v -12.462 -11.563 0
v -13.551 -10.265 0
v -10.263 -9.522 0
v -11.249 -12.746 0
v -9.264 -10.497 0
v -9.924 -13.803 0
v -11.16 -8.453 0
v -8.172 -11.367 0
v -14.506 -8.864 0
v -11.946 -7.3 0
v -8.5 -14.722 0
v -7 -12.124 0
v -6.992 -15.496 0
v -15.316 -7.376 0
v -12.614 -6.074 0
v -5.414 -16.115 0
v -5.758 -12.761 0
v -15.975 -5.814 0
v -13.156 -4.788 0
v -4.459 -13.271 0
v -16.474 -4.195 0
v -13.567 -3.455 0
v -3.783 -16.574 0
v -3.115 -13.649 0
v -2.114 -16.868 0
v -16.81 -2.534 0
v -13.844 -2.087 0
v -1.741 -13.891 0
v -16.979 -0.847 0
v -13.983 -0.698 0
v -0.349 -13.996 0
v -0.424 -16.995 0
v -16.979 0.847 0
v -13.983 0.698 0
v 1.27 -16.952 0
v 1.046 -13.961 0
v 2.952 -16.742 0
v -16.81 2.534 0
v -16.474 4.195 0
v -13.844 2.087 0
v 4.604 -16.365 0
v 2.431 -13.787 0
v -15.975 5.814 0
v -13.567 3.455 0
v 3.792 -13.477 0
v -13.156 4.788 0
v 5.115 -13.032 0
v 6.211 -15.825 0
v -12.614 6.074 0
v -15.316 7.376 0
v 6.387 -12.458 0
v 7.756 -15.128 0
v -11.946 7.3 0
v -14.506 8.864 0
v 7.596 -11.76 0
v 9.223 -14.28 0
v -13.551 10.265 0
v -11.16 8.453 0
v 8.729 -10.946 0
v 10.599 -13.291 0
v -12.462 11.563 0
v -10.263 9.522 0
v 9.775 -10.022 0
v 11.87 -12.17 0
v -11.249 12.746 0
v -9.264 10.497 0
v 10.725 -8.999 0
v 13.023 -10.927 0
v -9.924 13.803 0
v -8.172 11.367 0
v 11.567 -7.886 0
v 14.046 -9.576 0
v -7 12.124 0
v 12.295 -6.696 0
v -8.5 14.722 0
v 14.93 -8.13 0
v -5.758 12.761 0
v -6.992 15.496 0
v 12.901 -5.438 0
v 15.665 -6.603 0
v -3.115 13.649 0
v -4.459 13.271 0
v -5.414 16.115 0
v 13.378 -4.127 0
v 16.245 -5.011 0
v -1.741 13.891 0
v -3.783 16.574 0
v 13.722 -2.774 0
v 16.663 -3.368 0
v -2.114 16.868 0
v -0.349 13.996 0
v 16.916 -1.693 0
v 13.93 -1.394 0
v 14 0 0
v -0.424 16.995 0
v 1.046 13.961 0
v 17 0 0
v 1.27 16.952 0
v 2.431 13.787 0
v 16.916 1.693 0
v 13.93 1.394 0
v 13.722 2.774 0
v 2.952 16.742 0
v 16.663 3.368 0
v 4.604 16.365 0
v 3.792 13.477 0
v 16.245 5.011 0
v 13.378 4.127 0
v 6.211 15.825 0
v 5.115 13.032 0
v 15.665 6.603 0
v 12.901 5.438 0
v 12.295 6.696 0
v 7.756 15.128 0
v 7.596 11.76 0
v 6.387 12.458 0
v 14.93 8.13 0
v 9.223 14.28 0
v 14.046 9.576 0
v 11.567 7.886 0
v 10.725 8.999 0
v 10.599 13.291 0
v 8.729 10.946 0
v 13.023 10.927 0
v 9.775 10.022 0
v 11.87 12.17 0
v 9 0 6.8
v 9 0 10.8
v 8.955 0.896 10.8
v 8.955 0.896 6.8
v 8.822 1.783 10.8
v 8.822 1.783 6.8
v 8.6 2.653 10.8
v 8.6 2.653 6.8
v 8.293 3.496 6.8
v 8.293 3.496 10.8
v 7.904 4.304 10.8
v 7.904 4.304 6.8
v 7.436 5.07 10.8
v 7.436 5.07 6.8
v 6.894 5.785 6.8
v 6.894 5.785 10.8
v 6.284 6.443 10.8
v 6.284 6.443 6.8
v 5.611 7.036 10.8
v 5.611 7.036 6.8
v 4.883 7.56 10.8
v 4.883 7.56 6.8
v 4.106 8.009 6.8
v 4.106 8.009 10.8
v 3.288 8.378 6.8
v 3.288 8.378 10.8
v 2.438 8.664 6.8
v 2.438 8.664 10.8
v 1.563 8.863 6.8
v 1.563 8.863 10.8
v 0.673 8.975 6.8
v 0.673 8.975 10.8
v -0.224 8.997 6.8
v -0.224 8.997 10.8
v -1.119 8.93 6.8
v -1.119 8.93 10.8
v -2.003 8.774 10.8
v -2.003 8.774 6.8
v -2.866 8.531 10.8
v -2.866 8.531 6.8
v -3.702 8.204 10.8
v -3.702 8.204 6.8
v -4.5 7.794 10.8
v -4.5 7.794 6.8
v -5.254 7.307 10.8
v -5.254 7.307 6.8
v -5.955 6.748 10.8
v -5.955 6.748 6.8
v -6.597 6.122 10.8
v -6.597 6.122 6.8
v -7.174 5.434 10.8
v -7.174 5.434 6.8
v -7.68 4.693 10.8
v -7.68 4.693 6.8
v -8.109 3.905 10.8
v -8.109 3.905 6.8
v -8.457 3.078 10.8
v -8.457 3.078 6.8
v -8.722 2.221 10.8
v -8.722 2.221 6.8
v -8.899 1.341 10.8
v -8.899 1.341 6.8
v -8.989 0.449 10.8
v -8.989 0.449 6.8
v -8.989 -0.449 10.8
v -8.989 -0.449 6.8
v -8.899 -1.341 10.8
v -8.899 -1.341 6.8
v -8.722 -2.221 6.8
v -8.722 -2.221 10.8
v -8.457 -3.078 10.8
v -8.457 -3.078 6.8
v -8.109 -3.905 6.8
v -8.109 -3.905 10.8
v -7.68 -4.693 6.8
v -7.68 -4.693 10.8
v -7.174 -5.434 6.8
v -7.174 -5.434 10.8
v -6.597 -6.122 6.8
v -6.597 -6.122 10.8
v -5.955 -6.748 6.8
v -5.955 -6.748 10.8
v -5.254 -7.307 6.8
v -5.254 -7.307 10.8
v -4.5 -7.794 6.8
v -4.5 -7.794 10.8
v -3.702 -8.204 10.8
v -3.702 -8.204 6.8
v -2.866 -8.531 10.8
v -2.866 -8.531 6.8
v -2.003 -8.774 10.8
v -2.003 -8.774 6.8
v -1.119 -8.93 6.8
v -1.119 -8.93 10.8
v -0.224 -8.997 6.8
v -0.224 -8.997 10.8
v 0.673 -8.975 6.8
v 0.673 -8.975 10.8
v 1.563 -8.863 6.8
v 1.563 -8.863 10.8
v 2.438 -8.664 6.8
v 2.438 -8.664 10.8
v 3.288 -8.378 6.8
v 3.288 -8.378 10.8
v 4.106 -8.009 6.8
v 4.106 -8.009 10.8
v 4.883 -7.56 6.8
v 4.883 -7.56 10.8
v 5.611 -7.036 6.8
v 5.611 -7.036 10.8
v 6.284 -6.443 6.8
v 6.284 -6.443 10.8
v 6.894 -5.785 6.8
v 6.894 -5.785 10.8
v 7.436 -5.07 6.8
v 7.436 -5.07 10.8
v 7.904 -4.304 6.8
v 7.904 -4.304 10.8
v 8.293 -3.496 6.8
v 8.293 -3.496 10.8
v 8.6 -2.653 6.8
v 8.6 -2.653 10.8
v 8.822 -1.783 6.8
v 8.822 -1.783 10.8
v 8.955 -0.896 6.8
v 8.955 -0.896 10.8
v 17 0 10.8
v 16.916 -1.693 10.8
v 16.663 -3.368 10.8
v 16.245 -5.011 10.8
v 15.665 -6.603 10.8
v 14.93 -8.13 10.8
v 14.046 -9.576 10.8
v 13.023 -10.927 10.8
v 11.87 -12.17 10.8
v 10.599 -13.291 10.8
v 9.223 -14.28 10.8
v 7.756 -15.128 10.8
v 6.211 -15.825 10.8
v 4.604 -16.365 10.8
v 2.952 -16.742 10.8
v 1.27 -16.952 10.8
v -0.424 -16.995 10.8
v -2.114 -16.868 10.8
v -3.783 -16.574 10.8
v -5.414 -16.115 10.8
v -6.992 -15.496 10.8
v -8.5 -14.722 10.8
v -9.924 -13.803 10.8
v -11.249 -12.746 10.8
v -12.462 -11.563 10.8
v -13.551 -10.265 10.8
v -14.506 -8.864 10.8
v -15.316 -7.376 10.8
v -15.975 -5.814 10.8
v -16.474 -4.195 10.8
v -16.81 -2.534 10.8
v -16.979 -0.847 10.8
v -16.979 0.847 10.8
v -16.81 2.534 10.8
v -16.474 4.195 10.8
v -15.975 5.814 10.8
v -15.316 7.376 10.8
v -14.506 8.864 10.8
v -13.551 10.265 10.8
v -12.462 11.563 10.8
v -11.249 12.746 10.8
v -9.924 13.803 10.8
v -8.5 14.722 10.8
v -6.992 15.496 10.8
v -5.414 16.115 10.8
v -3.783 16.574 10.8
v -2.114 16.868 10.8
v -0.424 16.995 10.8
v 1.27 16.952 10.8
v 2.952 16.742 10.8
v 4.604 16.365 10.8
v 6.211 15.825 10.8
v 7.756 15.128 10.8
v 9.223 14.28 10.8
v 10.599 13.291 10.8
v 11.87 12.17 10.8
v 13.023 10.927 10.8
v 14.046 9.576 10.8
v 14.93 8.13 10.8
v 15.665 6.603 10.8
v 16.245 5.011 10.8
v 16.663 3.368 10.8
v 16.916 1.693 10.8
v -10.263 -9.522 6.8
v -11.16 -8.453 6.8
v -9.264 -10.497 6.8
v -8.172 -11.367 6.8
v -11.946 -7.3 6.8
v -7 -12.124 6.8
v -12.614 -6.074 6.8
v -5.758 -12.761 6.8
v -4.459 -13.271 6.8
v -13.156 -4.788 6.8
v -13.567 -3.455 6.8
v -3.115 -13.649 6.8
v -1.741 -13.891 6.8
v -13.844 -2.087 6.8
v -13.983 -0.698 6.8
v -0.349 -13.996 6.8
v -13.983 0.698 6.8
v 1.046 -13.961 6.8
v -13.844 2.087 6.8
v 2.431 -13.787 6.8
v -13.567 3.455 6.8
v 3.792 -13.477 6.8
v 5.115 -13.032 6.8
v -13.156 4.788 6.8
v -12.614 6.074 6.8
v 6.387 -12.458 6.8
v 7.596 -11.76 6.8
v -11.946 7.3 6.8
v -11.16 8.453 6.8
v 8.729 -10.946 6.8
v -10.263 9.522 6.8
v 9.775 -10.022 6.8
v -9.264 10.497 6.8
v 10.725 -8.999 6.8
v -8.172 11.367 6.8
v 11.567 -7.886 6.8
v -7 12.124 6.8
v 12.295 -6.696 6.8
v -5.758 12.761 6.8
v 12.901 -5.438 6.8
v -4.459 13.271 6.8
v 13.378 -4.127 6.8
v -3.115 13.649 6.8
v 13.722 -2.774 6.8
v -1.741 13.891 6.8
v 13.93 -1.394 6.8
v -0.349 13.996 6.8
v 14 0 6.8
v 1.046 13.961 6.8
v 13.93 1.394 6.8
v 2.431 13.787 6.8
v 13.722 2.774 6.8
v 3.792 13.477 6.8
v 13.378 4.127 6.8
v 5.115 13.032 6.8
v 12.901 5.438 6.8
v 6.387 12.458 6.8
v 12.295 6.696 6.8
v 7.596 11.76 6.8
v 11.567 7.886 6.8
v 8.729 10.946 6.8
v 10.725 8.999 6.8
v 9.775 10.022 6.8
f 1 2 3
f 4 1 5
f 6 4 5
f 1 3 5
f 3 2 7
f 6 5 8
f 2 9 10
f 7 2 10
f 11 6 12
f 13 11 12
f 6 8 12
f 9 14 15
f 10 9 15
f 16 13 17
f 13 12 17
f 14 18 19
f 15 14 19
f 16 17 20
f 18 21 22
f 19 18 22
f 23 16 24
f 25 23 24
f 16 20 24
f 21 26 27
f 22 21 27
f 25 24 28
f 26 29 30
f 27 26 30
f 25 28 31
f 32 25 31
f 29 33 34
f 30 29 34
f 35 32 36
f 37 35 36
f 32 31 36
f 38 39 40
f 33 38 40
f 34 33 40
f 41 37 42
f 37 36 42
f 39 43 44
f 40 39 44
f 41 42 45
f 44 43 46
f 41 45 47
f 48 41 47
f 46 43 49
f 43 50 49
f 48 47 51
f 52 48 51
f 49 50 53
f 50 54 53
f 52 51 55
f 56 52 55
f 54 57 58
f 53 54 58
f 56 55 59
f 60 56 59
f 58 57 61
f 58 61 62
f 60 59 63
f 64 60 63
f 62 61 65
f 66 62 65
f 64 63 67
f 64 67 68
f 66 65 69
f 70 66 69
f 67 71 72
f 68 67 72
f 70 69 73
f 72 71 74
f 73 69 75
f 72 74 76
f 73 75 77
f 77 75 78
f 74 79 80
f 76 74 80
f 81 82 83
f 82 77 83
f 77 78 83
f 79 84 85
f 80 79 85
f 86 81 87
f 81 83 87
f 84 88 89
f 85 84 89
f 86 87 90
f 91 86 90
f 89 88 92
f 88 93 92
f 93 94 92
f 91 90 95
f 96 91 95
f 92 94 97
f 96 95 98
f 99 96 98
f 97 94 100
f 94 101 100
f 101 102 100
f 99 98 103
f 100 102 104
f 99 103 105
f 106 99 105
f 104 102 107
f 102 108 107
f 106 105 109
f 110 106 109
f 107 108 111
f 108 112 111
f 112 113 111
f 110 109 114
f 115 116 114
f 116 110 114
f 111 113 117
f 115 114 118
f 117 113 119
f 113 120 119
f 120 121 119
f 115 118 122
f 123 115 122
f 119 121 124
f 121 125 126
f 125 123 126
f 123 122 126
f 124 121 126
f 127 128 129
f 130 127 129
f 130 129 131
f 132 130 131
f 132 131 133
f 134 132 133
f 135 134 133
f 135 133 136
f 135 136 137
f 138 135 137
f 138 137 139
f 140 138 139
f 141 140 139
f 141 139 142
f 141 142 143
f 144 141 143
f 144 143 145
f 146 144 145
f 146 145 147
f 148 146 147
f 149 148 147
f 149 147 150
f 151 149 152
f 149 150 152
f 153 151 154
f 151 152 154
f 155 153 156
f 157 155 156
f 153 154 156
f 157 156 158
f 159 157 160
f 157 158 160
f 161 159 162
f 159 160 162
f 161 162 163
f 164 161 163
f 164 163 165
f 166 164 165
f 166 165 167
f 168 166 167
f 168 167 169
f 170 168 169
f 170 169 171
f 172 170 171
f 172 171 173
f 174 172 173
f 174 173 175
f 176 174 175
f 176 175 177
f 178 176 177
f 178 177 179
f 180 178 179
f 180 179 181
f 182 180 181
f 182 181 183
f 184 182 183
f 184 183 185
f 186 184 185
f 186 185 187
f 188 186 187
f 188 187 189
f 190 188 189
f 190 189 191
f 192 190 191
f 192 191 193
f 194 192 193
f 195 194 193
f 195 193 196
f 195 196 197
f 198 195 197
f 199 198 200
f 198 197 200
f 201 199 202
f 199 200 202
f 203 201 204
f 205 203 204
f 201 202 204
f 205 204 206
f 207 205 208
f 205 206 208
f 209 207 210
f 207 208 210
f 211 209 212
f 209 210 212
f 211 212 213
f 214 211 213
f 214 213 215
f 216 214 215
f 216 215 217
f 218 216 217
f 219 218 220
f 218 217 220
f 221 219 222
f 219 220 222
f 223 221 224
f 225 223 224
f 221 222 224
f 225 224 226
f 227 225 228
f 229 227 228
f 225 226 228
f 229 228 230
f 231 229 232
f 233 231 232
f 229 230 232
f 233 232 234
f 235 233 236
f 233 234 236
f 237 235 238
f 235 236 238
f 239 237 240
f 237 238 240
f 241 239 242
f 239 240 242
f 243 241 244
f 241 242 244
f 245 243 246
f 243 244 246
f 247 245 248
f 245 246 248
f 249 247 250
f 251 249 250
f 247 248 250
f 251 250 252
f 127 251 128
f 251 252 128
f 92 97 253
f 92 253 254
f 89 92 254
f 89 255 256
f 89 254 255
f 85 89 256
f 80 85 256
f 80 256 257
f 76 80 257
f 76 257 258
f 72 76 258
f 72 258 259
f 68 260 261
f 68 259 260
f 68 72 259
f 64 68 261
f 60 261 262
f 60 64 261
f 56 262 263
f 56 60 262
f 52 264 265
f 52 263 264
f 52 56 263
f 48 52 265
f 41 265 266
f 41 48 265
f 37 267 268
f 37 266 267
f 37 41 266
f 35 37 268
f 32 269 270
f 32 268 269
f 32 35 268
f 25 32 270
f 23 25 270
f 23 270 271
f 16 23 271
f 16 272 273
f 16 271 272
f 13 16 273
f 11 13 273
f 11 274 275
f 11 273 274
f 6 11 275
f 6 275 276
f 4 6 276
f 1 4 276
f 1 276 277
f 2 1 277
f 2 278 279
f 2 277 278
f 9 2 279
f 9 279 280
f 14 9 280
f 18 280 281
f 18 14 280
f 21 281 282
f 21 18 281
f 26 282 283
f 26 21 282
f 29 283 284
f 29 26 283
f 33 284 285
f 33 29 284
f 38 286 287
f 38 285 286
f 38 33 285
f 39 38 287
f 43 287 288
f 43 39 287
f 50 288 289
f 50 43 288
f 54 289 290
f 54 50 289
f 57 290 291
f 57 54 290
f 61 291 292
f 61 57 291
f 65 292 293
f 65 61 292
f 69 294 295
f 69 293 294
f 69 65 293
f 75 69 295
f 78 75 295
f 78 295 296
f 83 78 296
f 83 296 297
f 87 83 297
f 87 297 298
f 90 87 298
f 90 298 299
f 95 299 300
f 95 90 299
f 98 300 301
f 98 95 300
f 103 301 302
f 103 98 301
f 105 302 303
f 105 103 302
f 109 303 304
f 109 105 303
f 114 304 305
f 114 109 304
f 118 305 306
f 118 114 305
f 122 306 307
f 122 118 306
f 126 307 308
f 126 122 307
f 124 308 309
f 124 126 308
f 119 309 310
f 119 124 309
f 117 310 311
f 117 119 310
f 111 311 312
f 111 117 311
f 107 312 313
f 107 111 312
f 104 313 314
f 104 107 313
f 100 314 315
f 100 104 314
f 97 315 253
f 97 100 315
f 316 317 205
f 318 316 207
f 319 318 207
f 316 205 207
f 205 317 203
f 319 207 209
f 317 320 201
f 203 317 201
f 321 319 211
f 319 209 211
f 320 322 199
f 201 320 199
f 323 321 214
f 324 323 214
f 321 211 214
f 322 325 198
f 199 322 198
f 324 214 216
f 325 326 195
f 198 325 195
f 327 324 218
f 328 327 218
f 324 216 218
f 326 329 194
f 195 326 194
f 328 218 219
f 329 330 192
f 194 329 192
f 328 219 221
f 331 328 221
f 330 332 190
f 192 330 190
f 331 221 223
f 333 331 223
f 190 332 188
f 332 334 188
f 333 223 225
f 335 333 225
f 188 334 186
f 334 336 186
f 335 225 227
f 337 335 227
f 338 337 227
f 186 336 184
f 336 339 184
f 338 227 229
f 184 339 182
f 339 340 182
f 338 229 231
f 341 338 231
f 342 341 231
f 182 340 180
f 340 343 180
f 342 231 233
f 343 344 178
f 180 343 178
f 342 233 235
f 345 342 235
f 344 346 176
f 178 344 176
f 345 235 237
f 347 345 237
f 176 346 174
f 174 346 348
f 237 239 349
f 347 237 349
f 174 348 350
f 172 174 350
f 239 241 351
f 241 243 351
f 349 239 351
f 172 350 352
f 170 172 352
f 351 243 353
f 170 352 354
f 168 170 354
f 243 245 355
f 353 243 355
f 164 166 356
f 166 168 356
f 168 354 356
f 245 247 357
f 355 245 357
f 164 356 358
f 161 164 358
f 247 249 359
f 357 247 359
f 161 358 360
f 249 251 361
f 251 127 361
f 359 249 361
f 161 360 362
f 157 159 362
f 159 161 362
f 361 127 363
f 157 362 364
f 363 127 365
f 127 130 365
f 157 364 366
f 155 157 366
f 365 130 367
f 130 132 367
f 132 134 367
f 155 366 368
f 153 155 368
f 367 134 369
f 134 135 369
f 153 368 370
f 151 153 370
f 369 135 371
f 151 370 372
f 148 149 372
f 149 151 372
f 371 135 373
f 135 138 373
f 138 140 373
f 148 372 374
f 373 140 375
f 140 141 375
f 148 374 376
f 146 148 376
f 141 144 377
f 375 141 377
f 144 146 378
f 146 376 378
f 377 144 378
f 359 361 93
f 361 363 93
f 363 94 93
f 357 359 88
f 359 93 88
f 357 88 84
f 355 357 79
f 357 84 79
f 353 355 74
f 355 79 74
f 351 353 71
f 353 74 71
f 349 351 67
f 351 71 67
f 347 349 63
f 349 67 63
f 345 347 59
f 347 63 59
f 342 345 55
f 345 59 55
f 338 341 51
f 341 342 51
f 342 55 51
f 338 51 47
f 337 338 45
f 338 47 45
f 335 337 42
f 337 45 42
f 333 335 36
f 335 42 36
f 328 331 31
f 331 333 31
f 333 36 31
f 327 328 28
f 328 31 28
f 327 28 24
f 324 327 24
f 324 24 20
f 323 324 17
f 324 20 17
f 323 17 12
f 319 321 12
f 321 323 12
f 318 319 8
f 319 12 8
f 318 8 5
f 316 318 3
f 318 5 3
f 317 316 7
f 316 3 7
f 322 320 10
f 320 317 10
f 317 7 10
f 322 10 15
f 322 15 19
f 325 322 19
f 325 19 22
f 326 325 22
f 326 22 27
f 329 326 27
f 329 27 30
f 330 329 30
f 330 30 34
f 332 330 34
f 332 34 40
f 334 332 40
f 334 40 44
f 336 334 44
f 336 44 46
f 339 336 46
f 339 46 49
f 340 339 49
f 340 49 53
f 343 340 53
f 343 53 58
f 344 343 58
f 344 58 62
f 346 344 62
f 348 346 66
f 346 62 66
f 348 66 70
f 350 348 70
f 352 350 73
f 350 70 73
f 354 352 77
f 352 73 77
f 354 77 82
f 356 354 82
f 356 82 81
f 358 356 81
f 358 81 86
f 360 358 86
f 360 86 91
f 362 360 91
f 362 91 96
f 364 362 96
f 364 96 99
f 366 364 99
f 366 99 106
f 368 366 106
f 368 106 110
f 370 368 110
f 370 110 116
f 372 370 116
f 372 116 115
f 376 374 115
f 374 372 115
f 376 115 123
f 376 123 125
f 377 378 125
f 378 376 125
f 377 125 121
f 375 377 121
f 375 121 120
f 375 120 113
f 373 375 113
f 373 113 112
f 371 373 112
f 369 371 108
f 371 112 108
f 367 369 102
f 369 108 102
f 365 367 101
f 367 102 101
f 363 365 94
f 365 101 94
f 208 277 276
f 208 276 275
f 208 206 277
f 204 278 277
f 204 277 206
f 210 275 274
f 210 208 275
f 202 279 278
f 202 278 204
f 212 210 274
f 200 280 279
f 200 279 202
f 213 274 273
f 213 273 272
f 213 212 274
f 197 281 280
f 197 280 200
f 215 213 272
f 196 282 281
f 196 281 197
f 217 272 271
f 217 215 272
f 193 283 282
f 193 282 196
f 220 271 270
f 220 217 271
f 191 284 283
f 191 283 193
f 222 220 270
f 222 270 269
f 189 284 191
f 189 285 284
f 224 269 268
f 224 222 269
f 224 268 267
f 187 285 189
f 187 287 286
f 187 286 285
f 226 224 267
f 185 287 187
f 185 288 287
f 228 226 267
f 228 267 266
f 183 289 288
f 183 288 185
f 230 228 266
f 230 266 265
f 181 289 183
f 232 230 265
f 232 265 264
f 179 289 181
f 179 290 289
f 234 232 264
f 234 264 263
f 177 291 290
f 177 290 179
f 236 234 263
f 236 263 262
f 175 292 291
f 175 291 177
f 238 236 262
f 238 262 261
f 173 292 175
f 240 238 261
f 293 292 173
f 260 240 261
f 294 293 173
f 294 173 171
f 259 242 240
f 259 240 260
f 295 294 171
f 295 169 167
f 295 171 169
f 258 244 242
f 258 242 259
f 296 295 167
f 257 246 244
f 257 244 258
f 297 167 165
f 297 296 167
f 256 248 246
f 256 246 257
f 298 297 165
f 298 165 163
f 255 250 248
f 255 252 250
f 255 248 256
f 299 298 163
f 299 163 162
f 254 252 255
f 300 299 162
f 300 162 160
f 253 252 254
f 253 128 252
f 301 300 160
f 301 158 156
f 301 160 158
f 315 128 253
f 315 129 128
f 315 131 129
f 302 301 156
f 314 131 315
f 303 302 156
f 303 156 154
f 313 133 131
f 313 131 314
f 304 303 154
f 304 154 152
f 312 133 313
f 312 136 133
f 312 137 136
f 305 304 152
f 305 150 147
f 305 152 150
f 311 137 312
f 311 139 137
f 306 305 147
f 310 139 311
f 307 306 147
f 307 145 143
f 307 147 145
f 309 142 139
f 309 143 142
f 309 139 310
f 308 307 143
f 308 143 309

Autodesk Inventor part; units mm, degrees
ref_plane "YZ Plane" through (0, 0, 0) normal (1, 0, 0) x (0, 1, 0)
ref_plane "XZ Plane" through (0, 0, 0) normal (0, 1, 0) x (-1, 0, 0)
ref_plane "XY Plane" through (0, 0, 0) normal (0, 0, 1) x (1, 0, 0)
sketch "Sketch1" plane through (0, 0, 0) normal (0, 0, 1) x (1, 0, 0)
  circle A0 centre (0, 0) radius 14
  circle A1 centre (0, 0) radius 17
  dimension "d0" = 28
  dimension "d2" = 34
extrude "Extrusion1" add sketch "Sketch1" along normal blind 6.8
sketch "Sketch2" plane through (0, 0, 6.8) normal (0, 0, 1) x (1, 0, 0)
  circle A0 centre (0, 0) radius 17 projected
extrude "Extrusion2" add sketch "Sketch2" along normal blind 4
sketch "Sketch3" plane through (0, 0, 10.8) normal (0, 0, 1) x (1, 0, 0)
  circle A0 centre (0, 0) radius 17 projected
  circle A1 centre (0, 0) radius 9
  dimension "d7" = 18
extrude "Extrusion3" cut sketch "Sketch3" against normal blind 4 contours A1
properties part number "Bearing cap"
